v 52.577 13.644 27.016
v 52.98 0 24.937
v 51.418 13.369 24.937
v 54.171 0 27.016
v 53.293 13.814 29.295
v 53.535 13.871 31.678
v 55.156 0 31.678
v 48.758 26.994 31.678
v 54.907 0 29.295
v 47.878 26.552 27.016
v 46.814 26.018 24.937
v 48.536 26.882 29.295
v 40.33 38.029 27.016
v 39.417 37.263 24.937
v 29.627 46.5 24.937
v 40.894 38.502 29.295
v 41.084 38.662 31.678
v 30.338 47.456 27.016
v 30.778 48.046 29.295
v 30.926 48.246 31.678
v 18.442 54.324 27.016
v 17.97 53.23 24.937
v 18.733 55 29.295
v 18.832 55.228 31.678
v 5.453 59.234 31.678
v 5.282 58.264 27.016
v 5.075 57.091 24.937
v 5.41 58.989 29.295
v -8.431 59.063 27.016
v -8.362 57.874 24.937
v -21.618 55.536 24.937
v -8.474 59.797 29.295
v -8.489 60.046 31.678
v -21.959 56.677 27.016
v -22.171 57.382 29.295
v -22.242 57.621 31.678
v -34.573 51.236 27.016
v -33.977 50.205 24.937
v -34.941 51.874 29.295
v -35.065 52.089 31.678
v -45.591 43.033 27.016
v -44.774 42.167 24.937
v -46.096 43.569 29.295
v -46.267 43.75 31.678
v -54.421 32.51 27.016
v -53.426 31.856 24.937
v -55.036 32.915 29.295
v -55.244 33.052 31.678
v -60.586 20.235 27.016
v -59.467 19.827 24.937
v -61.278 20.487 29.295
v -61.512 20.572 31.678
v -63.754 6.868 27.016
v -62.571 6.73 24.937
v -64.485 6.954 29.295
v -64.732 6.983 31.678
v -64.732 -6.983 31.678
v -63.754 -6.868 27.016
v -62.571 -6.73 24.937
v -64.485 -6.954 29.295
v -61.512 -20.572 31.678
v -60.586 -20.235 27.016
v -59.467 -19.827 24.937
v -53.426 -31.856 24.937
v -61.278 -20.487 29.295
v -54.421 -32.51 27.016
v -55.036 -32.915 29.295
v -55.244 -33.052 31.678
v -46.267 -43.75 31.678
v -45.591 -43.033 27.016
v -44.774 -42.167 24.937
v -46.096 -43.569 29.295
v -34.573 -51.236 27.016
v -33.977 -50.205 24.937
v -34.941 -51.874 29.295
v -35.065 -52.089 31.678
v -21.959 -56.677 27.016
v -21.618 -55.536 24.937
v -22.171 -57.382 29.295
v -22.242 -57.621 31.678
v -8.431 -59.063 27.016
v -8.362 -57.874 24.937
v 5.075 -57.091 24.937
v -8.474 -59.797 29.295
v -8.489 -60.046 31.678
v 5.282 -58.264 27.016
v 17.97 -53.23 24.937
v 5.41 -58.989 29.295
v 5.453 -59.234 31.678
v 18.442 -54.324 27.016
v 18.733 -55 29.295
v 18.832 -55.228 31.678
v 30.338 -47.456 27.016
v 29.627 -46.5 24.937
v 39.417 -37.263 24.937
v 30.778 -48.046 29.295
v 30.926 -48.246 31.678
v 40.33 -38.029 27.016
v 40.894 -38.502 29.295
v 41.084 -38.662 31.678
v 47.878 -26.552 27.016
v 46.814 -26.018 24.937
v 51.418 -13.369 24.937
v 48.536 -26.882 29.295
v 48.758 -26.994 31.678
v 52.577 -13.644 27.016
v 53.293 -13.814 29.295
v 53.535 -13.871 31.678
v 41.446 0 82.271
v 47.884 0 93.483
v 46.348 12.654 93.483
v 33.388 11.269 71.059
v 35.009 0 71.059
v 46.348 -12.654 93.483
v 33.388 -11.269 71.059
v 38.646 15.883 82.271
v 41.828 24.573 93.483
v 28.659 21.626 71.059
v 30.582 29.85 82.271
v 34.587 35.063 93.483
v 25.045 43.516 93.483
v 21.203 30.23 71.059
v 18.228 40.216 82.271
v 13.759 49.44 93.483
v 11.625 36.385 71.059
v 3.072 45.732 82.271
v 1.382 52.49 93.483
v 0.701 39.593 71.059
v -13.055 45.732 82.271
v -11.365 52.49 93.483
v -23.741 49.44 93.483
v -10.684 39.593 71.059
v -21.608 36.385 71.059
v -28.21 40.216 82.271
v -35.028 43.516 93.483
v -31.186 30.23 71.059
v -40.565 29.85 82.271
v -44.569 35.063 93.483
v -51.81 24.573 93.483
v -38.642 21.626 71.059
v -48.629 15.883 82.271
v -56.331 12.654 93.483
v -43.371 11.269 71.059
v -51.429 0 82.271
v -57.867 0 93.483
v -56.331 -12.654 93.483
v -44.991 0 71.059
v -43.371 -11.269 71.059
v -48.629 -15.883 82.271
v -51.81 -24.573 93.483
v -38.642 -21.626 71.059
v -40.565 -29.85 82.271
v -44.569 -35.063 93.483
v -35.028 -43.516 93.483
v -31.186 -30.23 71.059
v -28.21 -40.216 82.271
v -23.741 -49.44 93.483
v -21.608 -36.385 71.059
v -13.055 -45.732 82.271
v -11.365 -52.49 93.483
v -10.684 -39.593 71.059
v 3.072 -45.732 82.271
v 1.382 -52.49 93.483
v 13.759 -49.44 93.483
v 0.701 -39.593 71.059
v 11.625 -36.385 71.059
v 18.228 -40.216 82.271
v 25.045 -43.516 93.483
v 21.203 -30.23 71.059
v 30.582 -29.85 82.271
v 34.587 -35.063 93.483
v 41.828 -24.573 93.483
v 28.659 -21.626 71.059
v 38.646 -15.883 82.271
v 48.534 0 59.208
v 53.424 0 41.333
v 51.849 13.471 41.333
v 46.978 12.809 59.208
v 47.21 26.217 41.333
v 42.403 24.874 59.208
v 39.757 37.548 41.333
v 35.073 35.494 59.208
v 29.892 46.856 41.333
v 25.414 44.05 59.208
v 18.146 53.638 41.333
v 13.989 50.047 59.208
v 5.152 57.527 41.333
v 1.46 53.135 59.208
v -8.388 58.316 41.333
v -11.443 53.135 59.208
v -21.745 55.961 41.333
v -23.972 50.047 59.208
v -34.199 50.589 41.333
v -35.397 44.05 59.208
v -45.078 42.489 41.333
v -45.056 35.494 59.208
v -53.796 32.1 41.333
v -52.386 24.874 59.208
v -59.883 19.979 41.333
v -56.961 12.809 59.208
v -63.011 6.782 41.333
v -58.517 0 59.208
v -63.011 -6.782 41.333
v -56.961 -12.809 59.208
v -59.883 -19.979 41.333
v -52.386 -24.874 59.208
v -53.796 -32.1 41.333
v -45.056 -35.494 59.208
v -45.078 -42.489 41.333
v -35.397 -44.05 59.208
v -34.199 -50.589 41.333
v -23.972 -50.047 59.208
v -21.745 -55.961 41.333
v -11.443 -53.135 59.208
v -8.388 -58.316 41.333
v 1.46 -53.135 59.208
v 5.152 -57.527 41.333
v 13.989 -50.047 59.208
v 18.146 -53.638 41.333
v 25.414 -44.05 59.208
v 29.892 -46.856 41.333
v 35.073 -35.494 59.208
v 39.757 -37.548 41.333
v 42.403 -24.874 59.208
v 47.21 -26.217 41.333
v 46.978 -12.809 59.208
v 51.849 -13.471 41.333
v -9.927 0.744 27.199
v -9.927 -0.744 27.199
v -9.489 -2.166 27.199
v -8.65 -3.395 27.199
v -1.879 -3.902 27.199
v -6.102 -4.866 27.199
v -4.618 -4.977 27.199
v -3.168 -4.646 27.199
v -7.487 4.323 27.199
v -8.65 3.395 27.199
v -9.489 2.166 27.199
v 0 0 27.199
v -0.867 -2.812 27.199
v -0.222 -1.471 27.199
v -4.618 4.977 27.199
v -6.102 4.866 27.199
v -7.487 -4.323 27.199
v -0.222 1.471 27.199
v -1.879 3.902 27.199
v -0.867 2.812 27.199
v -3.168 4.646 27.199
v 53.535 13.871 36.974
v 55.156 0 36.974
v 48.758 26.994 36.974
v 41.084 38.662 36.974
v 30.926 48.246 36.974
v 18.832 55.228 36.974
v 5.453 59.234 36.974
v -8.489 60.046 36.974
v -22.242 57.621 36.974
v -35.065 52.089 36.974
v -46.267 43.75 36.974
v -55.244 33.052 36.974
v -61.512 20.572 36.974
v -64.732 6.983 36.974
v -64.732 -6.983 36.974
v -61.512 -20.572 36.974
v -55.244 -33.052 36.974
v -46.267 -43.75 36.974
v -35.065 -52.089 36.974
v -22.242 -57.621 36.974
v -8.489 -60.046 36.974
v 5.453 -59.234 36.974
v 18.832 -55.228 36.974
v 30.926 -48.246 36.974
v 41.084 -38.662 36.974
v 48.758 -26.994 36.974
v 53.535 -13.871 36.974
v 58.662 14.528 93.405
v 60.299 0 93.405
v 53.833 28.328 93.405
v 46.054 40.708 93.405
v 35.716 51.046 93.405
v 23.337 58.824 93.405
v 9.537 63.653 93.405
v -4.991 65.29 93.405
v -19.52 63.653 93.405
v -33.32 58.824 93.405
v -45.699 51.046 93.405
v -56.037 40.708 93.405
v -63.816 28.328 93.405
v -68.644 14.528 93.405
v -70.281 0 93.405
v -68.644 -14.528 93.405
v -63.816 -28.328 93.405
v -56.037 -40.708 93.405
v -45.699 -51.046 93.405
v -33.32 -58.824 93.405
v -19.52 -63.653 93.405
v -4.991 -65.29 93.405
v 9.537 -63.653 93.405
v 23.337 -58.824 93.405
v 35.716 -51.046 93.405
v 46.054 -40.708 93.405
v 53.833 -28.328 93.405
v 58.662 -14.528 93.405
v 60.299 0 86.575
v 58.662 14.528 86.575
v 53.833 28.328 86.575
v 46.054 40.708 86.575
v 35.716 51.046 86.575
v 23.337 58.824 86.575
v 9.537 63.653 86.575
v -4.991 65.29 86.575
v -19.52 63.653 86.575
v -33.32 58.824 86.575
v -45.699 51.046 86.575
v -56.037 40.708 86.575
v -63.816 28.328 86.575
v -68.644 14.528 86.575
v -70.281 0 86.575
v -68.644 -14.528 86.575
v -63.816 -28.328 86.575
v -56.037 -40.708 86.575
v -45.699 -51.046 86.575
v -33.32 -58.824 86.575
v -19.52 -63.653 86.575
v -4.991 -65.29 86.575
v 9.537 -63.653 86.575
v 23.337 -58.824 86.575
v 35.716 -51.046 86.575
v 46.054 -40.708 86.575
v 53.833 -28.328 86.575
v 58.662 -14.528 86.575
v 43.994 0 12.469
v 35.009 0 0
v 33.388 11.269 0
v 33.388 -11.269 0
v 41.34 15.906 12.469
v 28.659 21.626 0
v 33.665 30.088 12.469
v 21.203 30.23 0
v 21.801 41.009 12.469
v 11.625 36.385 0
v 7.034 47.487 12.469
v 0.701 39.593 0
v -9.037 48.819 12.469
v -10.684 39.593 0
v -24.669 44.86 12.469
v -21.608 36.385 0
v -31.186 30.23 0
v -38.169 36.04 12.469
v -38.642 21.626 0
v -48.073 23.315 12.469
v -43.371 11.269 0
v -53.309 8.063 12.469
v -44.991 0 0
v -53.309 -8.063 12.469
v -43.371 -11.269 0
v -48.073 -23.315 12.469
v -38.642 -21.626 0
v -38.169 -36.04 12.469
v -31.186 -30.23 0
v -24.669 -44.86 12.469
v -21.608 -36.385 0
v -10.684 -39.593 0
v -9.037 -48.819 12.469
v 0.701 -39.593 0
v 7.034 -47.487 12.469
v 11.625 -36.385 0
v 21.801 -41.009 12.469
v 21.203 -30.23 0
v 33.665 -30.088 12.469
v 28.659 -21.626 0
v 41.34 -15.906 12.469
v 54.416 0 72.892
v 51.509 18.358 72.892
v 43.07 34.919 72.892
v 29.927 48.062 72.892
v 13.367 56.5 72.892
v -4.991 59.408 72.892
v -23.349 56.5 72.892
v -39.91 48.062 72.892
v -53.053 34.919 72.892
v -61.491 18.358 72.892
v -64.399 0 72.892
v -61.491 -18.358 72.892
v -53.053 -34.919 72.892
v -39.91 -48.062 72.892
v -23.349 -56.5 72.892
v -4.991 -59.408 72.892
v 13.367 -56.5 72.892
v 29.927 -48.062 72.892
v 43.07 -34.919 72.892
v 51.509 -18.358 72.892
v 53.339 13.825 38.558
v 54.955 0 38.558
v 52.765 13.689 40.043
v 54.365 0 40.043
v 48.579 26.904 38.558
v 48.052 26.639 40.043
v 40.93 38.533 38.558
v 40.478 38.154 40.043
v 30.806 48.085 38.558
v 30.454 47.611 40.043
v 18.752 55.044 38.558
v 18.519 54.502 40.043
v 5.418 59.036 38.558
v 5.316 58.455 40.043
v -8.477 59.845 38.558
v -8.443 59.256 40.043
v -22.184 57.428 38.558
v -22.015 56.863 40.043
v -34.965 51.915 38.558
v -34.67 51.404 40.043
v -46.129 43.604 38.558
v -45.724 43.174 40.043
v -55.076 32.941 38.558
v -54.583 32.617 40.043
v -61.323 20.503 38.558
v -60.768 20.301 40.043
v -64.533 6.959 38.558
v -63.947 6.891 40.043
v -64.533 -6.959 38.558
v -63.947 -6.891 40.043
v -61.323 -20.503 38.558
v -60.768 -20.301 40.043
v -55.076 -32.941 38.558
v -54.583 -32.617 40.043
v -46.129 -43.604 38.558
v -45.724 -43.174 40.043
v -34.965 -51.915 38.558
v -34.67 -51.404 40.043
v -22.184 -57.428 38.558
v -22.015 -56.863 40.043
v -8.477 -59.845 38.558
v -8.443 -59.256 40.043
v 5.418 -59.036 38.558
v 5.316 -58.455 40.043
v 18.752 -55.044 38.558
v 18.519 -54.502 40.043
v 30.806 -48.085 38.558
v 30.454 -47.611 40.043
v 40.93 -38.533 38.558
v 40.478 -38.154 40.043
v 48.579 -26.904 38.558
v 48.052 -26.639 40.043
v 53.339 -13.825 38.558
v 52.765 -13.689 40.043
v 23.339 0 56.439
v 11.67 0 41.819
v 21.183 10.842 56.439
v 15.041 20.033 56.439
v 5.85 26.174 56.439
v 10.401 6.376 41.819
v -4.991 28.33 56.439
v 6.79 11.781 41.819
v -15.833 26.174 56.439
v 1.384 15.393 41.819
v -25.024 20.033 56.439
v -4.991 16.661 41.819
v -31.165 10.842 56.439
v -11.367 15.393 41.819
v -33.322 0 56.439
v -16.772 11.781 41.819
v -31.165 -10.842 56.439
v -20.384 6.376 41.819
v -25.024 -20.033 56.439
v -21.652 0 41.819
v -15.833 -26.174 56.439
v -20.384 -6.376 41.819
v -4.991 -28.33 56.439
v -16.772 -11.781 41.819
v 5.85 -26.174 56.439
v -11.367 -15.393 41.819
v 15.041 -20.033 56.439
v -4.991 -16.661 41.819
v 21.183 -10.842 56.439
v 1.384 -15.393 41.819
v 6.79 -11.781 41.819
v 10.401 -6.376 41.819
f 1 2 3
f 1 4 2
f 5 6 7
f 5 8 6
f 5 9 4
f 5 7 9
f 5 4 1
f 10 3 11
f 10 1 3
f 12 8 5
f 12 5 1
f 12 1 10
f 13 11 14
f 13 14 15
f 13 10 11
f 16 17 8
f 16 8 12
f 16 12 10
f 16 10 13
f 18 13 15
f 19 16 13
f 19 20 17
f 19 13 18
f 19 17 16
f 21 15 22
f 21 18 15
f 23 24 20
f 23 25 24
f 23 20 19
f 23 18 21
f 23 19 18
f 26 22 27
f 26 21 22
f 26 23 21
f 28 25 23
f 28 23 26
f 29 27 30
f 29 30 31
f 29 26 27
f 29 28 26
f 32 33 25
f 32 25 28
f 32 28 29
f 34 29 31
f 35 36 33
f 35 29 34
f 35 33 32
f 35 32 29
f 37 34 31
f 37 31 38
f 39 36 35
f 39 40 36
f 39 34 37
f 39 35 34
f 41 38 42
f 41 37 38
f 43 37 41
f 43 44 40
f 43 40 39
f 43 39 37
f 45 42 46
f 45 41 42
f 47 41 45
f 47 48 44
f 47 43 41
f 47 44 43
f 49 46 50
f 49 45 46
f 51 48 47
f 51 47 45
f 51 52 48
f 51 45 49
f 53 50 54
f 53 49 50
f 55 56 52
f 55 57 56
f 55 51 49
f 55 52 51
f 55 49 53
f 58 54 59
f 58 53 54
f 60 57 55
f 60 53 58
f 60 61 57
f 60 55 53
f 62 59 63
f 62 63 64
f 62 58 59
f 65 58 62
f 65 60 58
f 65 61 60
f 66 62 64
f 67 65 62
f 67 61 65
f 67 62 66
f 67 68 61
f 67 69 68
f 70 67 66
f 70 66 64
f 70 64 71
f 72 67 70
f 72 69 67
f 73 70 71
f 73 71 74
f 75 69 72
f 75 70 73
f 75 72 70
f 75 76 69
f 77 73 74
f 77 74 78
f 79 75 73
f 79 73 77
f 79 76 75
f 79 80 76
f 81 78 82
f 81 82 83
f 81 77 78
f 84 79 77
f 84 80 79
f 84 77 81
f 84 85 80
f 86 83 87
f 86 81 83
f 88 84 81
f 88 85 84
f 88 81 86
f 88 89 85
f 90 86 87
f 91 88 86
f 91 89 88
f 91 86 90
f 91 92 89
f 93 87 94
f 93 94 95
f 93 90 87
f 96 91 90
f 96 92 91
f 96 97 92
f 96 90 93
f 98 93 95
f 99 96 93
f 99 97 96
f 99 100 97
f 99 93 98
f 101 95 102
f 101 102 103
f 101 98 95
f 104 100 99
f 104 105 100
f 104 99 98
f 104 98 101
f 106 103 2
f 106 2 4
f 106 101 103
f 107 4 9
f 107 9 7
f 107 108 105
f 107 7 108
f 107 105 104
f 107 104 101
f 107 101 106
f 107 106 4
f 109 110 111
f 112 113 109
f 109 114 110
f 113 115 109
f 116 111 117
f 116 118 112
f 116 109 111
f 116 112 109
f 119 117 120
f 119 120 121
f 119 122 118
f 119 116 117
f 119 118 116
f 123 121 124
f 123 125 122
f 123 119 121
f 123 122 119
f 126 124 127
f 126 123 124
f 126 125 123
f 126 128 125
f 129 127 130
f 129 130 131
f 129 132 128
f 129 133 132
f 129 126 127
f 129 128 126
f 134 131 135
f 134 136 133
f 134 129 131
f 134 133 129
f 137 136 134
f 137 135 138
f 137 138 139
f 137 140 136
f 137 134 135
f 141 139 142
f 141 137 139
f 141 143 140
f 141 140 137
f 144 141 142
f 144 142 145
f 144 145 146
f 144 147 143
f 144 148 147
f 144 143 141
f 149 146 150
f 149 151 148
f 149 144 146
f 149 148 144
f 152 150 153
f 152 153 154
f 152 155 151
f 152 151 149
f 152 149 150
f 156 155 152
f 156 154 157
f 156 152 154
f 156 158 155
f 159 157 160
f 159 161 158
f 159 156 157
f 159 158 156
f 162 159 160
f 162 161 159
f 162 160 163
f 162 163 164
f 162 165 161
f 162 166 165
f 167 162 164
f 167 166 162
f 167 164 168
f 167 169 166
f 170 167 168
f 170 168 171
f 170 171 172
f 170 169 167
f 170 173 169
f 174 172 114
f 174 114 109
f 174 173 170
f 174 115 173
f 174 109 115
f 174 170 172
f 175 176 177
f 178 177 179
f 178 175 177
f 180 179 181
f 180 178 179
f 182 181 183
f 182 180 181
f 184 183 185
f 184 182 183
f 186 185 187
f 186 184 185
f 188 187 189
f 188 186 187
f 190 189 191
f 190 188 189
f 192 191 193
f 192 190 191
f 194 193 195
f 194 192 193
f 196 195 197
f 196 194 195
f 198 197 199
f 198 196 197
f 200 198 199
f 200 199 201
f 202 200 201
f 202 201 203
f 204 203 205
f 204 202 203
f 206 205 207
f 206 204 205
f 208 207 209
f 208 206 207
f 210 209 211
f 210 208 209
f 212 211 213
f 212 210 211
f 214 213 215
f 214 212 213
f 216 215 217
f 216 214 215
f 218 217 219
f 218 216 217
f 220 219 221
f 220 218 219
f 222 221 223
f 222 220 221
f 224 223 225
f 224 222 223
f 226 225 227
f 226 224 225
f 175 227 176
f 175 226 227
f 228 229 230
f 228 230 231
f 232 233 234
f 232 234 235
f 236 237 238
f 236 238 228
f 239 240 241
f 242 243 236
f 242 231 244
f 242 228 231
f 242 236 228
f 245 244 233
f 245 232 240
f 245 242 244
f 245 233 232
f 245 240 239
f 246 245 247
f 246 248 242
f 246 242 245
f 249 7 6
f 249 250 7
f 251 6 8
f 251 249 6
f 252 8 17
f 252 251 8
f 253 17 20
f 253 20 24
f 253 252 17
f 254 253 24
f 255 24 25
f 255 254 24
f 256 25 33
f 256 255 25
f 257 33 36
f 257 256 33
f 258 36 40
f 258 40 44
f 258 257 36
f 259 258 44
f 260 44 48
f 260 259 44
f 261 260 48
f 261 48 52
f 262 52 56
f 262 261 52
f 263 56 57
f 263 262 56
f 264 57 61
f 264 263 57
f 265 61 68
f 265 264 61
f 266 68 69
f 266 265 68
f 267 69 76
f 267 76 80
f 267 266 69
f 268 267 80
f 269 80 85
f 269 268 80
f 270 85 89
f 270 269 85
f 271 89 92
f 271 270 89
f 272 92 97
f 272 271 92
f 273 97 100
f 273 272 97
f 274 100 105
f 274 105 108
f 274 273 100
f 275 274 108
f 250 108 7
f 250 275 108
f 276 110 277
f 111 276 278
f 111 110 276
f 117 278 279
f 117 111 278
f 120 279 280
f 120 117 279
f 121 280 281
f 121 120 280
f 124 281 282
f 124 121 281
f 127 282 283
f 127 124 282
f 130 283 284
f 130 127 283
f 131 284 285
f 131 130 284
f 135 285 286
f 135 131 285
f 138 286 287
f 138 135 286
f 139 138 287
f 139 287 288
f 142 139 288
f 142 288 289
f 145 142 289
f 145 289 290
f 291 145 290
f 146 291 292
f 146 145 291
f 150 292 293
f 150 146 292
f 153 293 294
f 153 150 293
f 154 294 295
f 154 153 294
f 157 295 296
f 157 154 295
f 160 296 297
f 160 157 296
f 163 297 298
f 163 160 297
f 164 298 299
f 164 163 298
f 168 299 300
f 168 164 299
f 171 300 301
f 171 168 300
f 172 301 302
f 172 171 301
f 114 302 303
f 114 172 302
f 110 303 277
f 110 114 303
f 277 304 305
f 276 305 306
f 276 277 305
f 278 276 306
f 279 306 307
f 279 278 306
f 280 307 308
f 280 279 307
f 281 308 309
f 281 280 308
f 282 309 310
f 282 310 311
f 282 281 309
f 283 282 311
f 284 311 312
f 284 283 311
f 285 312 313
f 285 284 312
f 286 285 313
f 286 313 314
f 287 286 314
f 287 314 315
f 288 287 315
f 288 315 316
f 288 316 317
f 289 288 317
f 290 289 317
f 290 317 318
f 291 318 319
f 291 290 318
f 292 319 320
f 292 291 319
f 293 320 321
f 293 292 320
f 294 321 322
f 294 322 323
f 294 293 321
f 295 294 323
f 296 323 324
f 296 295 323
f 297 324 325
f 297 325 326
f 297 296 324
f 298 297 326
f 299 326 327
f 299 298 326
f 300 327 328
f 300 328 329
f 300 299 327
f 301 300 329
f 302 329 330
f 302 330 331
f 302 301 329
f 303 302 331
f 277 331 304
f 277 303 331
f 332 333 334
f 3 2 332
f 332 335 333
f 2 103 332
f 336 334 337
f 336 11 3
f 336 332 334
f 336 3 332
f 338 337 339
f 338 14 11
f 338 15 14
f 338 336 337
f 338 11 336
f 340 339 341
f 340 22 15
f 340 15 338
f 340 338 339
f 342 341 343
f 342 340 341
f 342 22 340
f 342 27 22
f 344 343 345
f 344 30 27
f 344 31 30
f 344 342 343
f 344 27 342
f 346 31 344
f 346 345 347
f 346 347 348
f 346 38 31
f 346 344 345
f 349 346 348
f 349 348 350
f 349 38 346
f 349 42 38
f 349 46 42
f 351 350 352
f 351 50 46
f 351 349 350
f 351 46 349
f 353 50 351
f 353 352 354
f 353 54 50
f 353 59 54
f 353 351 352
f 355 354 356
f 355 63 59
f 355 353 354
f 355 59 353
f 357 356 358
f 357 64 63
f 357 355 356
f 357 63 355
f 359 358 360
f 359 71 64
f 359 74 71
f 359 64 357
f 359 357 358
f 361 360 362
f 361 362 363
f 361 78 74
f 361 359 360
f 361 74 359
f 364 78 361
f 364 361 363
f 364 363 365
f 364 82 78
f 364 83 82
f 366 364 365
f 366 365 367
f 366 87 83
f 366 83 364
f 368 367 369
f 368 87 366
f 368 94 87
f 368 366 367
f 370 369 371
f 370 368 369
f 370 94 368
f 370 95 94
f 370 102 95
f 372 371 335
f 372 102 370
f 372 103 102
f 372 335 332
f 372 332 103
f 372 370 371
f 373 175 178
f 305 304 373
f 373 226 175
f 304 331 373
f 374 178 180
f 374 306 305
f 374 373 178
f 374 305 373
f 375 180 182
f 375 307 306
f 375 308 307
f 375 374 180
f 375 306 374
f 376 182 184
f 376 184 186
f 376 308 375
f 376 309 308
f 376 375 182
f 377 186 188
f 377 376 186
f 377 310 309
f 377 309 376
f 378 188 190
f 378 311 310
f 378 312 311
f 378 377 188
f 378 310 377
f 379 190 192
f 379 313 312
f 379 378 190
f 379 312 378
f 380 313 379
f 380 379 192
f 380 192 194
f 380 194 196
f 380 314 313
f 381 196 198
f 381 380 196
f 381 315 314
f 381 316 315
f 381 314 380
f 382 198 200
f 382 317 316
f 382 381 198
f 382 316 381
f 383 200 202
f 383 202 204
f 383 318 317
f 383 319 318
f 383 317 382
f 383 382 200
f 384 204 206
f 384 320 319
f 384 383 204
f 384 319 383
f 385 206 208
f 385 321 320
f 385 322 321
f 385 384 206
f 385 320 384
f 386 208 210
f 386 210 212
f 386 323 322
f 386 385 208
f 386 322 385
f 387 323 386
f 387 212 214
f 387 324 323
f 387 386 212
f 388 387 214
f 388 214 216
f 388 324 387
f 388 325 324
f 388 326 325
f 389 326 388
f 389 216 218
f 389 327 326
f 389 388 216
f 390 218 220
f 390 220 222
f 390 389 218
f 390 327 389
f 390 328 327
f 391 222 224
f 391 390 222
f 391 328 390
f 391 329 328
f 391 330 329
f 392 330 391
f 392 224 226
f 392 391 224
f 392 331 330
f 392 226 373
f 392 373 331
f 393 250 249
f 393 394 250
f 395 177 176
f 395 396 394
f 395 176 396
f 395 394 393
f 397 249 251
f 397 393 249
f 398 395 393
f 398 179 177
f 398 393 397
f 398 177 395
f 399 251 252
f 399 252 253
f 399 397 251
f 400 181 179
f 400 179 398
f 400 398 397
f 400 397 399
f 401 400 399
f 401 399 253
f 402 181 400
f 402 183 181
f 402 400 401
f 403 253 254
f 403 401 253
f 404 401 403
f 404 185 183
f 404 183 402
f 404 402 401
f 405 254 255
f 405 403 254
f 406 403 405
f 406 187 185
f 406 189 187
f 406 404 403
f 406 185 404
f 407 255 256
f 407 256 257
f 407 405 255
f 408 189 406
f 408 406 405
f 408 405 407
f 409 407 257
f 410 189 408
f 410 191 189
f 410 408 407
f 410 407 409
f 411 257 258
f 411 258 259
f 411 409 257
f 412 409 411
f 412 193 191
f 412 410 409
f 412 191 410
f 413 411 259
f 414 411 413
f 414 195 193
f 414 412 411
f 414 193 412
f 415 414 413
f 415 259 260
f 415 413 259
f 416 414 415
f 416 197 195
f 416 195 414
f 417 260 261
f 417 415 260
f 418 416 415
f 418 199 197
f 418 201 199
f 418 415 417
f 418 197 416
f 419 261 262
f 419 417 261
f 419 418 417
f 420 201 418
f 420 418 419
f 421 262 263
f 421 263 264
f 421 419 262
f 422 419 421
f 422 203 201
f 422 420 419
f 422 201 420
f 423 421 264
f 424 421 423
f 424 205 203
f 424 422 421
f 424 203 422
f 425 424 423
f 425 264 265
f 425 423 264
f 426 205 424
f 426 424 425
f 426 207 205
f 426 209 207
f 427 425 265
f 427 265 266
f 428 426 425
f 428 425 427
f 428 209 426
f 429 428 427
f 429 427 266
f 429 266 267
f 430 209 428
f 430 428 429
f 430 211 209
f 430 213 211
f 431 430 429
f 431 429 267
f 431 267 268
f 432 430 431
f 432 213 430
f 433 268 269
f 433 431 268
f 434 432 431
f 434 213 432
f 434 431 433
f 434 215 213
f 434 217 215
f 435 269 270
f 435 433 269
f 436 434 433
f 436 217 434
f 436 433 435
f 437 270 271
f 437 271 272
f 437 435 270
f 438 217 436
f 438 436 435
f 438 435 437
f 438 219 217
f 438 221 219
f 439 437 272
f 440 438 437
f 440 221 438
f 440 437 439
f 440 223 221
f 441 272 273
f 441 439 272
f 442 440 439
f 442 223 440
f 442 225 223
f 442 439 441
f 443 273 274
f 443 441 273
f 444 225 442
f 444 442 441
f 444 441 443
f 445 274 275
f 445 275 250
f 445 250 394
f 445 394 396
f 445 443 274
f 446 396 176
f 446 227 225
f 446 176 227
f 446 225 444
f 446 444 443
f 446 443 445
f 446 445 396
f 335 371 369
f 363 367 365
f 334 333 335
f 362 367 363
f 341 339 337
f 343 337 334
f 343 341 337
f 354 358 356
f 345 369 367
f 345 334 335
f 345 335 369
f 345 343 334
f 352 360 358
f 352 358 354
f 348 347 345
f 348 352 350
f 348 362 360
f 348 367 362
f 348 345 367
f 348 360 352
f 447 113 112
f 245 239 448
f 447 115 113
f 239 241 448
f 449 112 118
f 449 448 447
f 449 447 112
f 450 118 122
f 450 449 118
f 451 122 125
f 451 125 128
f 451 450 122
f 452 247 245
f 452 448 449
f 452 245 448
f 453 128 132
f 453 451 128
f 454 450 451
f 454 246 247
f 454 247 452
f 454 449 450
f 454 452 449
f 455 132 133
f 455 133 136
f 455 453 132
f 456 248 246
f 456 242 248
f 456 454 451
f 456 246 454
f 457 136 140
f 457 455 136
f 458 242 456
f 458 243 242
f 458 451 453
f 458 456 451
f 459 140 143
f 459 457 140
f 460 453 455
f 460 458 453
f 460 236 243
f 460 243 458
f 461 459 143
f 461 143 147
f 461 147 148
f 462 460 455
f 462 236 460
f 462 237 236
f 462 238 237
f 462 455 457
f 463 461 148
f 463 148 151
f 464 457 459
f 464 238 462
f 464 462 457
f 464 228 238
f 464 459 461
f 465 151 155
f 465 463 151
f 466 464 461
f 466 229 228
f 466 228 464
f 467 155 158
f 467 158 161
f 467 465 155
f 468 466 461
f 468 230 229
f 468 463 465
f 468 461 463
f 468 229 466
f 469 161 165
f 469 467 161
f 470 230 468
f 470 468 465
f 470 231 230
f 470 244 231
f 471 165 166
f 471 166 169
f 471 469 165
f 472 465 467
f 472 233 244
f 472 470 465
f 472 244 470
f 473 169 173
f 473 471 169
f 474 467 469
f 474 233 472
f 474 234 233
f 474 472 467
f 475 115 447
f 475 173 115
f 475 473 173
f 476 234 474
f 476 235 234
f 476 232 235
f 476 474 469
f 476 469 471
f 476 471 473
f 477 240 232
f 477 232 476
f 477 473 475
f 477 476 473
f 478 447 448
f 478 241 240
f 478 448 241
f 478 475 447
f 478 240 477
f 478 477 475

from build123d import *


with BuildPart() as f1:
    # F0 (on Front) → F1 (revolve)
    with BuildSketch(Plane.XZ):
        with BuildLine():
            Line((-4.991404, 27.199442), (-4.991404, 0))
            Line((-4.991404, 0), (35.008596, 0))
            Line((35.008596, 0), (52.980236, 24.937051))
            ThreePointArc((52.980236, 24.937051), (54.598683, 28.136221), (55.156134, 31.677874))
            Line((55.156134, 31.677874), (55.156134, 36.973636))
            ThreePointArc((55.156134, 36.973636), (54.70711, 39.319052), (53.423542, 41.332769))
            Line((53.423542, 41.332769), (48.533764, 59.208133))
            Line((48.533764, 59.208133), (60.298596, 86.575069))
            Line((60.298596, 86.575069), (60.298596, 93.405227))
            Line((60.298596, 93.405227), (47.884241, 93.482569))
            Line((47.884241, 93.482569), (35.008596, 71.05868))
            Line((35.008596, 71.05868), (0, 27.199442))
            Line((0, 27.199442), (-4.991404, 27.199442))
        make_face()
    revolve(axis=Axis((-4.991404, 0, 50.455429), (0, 0, 1)))


solid = f1.part
